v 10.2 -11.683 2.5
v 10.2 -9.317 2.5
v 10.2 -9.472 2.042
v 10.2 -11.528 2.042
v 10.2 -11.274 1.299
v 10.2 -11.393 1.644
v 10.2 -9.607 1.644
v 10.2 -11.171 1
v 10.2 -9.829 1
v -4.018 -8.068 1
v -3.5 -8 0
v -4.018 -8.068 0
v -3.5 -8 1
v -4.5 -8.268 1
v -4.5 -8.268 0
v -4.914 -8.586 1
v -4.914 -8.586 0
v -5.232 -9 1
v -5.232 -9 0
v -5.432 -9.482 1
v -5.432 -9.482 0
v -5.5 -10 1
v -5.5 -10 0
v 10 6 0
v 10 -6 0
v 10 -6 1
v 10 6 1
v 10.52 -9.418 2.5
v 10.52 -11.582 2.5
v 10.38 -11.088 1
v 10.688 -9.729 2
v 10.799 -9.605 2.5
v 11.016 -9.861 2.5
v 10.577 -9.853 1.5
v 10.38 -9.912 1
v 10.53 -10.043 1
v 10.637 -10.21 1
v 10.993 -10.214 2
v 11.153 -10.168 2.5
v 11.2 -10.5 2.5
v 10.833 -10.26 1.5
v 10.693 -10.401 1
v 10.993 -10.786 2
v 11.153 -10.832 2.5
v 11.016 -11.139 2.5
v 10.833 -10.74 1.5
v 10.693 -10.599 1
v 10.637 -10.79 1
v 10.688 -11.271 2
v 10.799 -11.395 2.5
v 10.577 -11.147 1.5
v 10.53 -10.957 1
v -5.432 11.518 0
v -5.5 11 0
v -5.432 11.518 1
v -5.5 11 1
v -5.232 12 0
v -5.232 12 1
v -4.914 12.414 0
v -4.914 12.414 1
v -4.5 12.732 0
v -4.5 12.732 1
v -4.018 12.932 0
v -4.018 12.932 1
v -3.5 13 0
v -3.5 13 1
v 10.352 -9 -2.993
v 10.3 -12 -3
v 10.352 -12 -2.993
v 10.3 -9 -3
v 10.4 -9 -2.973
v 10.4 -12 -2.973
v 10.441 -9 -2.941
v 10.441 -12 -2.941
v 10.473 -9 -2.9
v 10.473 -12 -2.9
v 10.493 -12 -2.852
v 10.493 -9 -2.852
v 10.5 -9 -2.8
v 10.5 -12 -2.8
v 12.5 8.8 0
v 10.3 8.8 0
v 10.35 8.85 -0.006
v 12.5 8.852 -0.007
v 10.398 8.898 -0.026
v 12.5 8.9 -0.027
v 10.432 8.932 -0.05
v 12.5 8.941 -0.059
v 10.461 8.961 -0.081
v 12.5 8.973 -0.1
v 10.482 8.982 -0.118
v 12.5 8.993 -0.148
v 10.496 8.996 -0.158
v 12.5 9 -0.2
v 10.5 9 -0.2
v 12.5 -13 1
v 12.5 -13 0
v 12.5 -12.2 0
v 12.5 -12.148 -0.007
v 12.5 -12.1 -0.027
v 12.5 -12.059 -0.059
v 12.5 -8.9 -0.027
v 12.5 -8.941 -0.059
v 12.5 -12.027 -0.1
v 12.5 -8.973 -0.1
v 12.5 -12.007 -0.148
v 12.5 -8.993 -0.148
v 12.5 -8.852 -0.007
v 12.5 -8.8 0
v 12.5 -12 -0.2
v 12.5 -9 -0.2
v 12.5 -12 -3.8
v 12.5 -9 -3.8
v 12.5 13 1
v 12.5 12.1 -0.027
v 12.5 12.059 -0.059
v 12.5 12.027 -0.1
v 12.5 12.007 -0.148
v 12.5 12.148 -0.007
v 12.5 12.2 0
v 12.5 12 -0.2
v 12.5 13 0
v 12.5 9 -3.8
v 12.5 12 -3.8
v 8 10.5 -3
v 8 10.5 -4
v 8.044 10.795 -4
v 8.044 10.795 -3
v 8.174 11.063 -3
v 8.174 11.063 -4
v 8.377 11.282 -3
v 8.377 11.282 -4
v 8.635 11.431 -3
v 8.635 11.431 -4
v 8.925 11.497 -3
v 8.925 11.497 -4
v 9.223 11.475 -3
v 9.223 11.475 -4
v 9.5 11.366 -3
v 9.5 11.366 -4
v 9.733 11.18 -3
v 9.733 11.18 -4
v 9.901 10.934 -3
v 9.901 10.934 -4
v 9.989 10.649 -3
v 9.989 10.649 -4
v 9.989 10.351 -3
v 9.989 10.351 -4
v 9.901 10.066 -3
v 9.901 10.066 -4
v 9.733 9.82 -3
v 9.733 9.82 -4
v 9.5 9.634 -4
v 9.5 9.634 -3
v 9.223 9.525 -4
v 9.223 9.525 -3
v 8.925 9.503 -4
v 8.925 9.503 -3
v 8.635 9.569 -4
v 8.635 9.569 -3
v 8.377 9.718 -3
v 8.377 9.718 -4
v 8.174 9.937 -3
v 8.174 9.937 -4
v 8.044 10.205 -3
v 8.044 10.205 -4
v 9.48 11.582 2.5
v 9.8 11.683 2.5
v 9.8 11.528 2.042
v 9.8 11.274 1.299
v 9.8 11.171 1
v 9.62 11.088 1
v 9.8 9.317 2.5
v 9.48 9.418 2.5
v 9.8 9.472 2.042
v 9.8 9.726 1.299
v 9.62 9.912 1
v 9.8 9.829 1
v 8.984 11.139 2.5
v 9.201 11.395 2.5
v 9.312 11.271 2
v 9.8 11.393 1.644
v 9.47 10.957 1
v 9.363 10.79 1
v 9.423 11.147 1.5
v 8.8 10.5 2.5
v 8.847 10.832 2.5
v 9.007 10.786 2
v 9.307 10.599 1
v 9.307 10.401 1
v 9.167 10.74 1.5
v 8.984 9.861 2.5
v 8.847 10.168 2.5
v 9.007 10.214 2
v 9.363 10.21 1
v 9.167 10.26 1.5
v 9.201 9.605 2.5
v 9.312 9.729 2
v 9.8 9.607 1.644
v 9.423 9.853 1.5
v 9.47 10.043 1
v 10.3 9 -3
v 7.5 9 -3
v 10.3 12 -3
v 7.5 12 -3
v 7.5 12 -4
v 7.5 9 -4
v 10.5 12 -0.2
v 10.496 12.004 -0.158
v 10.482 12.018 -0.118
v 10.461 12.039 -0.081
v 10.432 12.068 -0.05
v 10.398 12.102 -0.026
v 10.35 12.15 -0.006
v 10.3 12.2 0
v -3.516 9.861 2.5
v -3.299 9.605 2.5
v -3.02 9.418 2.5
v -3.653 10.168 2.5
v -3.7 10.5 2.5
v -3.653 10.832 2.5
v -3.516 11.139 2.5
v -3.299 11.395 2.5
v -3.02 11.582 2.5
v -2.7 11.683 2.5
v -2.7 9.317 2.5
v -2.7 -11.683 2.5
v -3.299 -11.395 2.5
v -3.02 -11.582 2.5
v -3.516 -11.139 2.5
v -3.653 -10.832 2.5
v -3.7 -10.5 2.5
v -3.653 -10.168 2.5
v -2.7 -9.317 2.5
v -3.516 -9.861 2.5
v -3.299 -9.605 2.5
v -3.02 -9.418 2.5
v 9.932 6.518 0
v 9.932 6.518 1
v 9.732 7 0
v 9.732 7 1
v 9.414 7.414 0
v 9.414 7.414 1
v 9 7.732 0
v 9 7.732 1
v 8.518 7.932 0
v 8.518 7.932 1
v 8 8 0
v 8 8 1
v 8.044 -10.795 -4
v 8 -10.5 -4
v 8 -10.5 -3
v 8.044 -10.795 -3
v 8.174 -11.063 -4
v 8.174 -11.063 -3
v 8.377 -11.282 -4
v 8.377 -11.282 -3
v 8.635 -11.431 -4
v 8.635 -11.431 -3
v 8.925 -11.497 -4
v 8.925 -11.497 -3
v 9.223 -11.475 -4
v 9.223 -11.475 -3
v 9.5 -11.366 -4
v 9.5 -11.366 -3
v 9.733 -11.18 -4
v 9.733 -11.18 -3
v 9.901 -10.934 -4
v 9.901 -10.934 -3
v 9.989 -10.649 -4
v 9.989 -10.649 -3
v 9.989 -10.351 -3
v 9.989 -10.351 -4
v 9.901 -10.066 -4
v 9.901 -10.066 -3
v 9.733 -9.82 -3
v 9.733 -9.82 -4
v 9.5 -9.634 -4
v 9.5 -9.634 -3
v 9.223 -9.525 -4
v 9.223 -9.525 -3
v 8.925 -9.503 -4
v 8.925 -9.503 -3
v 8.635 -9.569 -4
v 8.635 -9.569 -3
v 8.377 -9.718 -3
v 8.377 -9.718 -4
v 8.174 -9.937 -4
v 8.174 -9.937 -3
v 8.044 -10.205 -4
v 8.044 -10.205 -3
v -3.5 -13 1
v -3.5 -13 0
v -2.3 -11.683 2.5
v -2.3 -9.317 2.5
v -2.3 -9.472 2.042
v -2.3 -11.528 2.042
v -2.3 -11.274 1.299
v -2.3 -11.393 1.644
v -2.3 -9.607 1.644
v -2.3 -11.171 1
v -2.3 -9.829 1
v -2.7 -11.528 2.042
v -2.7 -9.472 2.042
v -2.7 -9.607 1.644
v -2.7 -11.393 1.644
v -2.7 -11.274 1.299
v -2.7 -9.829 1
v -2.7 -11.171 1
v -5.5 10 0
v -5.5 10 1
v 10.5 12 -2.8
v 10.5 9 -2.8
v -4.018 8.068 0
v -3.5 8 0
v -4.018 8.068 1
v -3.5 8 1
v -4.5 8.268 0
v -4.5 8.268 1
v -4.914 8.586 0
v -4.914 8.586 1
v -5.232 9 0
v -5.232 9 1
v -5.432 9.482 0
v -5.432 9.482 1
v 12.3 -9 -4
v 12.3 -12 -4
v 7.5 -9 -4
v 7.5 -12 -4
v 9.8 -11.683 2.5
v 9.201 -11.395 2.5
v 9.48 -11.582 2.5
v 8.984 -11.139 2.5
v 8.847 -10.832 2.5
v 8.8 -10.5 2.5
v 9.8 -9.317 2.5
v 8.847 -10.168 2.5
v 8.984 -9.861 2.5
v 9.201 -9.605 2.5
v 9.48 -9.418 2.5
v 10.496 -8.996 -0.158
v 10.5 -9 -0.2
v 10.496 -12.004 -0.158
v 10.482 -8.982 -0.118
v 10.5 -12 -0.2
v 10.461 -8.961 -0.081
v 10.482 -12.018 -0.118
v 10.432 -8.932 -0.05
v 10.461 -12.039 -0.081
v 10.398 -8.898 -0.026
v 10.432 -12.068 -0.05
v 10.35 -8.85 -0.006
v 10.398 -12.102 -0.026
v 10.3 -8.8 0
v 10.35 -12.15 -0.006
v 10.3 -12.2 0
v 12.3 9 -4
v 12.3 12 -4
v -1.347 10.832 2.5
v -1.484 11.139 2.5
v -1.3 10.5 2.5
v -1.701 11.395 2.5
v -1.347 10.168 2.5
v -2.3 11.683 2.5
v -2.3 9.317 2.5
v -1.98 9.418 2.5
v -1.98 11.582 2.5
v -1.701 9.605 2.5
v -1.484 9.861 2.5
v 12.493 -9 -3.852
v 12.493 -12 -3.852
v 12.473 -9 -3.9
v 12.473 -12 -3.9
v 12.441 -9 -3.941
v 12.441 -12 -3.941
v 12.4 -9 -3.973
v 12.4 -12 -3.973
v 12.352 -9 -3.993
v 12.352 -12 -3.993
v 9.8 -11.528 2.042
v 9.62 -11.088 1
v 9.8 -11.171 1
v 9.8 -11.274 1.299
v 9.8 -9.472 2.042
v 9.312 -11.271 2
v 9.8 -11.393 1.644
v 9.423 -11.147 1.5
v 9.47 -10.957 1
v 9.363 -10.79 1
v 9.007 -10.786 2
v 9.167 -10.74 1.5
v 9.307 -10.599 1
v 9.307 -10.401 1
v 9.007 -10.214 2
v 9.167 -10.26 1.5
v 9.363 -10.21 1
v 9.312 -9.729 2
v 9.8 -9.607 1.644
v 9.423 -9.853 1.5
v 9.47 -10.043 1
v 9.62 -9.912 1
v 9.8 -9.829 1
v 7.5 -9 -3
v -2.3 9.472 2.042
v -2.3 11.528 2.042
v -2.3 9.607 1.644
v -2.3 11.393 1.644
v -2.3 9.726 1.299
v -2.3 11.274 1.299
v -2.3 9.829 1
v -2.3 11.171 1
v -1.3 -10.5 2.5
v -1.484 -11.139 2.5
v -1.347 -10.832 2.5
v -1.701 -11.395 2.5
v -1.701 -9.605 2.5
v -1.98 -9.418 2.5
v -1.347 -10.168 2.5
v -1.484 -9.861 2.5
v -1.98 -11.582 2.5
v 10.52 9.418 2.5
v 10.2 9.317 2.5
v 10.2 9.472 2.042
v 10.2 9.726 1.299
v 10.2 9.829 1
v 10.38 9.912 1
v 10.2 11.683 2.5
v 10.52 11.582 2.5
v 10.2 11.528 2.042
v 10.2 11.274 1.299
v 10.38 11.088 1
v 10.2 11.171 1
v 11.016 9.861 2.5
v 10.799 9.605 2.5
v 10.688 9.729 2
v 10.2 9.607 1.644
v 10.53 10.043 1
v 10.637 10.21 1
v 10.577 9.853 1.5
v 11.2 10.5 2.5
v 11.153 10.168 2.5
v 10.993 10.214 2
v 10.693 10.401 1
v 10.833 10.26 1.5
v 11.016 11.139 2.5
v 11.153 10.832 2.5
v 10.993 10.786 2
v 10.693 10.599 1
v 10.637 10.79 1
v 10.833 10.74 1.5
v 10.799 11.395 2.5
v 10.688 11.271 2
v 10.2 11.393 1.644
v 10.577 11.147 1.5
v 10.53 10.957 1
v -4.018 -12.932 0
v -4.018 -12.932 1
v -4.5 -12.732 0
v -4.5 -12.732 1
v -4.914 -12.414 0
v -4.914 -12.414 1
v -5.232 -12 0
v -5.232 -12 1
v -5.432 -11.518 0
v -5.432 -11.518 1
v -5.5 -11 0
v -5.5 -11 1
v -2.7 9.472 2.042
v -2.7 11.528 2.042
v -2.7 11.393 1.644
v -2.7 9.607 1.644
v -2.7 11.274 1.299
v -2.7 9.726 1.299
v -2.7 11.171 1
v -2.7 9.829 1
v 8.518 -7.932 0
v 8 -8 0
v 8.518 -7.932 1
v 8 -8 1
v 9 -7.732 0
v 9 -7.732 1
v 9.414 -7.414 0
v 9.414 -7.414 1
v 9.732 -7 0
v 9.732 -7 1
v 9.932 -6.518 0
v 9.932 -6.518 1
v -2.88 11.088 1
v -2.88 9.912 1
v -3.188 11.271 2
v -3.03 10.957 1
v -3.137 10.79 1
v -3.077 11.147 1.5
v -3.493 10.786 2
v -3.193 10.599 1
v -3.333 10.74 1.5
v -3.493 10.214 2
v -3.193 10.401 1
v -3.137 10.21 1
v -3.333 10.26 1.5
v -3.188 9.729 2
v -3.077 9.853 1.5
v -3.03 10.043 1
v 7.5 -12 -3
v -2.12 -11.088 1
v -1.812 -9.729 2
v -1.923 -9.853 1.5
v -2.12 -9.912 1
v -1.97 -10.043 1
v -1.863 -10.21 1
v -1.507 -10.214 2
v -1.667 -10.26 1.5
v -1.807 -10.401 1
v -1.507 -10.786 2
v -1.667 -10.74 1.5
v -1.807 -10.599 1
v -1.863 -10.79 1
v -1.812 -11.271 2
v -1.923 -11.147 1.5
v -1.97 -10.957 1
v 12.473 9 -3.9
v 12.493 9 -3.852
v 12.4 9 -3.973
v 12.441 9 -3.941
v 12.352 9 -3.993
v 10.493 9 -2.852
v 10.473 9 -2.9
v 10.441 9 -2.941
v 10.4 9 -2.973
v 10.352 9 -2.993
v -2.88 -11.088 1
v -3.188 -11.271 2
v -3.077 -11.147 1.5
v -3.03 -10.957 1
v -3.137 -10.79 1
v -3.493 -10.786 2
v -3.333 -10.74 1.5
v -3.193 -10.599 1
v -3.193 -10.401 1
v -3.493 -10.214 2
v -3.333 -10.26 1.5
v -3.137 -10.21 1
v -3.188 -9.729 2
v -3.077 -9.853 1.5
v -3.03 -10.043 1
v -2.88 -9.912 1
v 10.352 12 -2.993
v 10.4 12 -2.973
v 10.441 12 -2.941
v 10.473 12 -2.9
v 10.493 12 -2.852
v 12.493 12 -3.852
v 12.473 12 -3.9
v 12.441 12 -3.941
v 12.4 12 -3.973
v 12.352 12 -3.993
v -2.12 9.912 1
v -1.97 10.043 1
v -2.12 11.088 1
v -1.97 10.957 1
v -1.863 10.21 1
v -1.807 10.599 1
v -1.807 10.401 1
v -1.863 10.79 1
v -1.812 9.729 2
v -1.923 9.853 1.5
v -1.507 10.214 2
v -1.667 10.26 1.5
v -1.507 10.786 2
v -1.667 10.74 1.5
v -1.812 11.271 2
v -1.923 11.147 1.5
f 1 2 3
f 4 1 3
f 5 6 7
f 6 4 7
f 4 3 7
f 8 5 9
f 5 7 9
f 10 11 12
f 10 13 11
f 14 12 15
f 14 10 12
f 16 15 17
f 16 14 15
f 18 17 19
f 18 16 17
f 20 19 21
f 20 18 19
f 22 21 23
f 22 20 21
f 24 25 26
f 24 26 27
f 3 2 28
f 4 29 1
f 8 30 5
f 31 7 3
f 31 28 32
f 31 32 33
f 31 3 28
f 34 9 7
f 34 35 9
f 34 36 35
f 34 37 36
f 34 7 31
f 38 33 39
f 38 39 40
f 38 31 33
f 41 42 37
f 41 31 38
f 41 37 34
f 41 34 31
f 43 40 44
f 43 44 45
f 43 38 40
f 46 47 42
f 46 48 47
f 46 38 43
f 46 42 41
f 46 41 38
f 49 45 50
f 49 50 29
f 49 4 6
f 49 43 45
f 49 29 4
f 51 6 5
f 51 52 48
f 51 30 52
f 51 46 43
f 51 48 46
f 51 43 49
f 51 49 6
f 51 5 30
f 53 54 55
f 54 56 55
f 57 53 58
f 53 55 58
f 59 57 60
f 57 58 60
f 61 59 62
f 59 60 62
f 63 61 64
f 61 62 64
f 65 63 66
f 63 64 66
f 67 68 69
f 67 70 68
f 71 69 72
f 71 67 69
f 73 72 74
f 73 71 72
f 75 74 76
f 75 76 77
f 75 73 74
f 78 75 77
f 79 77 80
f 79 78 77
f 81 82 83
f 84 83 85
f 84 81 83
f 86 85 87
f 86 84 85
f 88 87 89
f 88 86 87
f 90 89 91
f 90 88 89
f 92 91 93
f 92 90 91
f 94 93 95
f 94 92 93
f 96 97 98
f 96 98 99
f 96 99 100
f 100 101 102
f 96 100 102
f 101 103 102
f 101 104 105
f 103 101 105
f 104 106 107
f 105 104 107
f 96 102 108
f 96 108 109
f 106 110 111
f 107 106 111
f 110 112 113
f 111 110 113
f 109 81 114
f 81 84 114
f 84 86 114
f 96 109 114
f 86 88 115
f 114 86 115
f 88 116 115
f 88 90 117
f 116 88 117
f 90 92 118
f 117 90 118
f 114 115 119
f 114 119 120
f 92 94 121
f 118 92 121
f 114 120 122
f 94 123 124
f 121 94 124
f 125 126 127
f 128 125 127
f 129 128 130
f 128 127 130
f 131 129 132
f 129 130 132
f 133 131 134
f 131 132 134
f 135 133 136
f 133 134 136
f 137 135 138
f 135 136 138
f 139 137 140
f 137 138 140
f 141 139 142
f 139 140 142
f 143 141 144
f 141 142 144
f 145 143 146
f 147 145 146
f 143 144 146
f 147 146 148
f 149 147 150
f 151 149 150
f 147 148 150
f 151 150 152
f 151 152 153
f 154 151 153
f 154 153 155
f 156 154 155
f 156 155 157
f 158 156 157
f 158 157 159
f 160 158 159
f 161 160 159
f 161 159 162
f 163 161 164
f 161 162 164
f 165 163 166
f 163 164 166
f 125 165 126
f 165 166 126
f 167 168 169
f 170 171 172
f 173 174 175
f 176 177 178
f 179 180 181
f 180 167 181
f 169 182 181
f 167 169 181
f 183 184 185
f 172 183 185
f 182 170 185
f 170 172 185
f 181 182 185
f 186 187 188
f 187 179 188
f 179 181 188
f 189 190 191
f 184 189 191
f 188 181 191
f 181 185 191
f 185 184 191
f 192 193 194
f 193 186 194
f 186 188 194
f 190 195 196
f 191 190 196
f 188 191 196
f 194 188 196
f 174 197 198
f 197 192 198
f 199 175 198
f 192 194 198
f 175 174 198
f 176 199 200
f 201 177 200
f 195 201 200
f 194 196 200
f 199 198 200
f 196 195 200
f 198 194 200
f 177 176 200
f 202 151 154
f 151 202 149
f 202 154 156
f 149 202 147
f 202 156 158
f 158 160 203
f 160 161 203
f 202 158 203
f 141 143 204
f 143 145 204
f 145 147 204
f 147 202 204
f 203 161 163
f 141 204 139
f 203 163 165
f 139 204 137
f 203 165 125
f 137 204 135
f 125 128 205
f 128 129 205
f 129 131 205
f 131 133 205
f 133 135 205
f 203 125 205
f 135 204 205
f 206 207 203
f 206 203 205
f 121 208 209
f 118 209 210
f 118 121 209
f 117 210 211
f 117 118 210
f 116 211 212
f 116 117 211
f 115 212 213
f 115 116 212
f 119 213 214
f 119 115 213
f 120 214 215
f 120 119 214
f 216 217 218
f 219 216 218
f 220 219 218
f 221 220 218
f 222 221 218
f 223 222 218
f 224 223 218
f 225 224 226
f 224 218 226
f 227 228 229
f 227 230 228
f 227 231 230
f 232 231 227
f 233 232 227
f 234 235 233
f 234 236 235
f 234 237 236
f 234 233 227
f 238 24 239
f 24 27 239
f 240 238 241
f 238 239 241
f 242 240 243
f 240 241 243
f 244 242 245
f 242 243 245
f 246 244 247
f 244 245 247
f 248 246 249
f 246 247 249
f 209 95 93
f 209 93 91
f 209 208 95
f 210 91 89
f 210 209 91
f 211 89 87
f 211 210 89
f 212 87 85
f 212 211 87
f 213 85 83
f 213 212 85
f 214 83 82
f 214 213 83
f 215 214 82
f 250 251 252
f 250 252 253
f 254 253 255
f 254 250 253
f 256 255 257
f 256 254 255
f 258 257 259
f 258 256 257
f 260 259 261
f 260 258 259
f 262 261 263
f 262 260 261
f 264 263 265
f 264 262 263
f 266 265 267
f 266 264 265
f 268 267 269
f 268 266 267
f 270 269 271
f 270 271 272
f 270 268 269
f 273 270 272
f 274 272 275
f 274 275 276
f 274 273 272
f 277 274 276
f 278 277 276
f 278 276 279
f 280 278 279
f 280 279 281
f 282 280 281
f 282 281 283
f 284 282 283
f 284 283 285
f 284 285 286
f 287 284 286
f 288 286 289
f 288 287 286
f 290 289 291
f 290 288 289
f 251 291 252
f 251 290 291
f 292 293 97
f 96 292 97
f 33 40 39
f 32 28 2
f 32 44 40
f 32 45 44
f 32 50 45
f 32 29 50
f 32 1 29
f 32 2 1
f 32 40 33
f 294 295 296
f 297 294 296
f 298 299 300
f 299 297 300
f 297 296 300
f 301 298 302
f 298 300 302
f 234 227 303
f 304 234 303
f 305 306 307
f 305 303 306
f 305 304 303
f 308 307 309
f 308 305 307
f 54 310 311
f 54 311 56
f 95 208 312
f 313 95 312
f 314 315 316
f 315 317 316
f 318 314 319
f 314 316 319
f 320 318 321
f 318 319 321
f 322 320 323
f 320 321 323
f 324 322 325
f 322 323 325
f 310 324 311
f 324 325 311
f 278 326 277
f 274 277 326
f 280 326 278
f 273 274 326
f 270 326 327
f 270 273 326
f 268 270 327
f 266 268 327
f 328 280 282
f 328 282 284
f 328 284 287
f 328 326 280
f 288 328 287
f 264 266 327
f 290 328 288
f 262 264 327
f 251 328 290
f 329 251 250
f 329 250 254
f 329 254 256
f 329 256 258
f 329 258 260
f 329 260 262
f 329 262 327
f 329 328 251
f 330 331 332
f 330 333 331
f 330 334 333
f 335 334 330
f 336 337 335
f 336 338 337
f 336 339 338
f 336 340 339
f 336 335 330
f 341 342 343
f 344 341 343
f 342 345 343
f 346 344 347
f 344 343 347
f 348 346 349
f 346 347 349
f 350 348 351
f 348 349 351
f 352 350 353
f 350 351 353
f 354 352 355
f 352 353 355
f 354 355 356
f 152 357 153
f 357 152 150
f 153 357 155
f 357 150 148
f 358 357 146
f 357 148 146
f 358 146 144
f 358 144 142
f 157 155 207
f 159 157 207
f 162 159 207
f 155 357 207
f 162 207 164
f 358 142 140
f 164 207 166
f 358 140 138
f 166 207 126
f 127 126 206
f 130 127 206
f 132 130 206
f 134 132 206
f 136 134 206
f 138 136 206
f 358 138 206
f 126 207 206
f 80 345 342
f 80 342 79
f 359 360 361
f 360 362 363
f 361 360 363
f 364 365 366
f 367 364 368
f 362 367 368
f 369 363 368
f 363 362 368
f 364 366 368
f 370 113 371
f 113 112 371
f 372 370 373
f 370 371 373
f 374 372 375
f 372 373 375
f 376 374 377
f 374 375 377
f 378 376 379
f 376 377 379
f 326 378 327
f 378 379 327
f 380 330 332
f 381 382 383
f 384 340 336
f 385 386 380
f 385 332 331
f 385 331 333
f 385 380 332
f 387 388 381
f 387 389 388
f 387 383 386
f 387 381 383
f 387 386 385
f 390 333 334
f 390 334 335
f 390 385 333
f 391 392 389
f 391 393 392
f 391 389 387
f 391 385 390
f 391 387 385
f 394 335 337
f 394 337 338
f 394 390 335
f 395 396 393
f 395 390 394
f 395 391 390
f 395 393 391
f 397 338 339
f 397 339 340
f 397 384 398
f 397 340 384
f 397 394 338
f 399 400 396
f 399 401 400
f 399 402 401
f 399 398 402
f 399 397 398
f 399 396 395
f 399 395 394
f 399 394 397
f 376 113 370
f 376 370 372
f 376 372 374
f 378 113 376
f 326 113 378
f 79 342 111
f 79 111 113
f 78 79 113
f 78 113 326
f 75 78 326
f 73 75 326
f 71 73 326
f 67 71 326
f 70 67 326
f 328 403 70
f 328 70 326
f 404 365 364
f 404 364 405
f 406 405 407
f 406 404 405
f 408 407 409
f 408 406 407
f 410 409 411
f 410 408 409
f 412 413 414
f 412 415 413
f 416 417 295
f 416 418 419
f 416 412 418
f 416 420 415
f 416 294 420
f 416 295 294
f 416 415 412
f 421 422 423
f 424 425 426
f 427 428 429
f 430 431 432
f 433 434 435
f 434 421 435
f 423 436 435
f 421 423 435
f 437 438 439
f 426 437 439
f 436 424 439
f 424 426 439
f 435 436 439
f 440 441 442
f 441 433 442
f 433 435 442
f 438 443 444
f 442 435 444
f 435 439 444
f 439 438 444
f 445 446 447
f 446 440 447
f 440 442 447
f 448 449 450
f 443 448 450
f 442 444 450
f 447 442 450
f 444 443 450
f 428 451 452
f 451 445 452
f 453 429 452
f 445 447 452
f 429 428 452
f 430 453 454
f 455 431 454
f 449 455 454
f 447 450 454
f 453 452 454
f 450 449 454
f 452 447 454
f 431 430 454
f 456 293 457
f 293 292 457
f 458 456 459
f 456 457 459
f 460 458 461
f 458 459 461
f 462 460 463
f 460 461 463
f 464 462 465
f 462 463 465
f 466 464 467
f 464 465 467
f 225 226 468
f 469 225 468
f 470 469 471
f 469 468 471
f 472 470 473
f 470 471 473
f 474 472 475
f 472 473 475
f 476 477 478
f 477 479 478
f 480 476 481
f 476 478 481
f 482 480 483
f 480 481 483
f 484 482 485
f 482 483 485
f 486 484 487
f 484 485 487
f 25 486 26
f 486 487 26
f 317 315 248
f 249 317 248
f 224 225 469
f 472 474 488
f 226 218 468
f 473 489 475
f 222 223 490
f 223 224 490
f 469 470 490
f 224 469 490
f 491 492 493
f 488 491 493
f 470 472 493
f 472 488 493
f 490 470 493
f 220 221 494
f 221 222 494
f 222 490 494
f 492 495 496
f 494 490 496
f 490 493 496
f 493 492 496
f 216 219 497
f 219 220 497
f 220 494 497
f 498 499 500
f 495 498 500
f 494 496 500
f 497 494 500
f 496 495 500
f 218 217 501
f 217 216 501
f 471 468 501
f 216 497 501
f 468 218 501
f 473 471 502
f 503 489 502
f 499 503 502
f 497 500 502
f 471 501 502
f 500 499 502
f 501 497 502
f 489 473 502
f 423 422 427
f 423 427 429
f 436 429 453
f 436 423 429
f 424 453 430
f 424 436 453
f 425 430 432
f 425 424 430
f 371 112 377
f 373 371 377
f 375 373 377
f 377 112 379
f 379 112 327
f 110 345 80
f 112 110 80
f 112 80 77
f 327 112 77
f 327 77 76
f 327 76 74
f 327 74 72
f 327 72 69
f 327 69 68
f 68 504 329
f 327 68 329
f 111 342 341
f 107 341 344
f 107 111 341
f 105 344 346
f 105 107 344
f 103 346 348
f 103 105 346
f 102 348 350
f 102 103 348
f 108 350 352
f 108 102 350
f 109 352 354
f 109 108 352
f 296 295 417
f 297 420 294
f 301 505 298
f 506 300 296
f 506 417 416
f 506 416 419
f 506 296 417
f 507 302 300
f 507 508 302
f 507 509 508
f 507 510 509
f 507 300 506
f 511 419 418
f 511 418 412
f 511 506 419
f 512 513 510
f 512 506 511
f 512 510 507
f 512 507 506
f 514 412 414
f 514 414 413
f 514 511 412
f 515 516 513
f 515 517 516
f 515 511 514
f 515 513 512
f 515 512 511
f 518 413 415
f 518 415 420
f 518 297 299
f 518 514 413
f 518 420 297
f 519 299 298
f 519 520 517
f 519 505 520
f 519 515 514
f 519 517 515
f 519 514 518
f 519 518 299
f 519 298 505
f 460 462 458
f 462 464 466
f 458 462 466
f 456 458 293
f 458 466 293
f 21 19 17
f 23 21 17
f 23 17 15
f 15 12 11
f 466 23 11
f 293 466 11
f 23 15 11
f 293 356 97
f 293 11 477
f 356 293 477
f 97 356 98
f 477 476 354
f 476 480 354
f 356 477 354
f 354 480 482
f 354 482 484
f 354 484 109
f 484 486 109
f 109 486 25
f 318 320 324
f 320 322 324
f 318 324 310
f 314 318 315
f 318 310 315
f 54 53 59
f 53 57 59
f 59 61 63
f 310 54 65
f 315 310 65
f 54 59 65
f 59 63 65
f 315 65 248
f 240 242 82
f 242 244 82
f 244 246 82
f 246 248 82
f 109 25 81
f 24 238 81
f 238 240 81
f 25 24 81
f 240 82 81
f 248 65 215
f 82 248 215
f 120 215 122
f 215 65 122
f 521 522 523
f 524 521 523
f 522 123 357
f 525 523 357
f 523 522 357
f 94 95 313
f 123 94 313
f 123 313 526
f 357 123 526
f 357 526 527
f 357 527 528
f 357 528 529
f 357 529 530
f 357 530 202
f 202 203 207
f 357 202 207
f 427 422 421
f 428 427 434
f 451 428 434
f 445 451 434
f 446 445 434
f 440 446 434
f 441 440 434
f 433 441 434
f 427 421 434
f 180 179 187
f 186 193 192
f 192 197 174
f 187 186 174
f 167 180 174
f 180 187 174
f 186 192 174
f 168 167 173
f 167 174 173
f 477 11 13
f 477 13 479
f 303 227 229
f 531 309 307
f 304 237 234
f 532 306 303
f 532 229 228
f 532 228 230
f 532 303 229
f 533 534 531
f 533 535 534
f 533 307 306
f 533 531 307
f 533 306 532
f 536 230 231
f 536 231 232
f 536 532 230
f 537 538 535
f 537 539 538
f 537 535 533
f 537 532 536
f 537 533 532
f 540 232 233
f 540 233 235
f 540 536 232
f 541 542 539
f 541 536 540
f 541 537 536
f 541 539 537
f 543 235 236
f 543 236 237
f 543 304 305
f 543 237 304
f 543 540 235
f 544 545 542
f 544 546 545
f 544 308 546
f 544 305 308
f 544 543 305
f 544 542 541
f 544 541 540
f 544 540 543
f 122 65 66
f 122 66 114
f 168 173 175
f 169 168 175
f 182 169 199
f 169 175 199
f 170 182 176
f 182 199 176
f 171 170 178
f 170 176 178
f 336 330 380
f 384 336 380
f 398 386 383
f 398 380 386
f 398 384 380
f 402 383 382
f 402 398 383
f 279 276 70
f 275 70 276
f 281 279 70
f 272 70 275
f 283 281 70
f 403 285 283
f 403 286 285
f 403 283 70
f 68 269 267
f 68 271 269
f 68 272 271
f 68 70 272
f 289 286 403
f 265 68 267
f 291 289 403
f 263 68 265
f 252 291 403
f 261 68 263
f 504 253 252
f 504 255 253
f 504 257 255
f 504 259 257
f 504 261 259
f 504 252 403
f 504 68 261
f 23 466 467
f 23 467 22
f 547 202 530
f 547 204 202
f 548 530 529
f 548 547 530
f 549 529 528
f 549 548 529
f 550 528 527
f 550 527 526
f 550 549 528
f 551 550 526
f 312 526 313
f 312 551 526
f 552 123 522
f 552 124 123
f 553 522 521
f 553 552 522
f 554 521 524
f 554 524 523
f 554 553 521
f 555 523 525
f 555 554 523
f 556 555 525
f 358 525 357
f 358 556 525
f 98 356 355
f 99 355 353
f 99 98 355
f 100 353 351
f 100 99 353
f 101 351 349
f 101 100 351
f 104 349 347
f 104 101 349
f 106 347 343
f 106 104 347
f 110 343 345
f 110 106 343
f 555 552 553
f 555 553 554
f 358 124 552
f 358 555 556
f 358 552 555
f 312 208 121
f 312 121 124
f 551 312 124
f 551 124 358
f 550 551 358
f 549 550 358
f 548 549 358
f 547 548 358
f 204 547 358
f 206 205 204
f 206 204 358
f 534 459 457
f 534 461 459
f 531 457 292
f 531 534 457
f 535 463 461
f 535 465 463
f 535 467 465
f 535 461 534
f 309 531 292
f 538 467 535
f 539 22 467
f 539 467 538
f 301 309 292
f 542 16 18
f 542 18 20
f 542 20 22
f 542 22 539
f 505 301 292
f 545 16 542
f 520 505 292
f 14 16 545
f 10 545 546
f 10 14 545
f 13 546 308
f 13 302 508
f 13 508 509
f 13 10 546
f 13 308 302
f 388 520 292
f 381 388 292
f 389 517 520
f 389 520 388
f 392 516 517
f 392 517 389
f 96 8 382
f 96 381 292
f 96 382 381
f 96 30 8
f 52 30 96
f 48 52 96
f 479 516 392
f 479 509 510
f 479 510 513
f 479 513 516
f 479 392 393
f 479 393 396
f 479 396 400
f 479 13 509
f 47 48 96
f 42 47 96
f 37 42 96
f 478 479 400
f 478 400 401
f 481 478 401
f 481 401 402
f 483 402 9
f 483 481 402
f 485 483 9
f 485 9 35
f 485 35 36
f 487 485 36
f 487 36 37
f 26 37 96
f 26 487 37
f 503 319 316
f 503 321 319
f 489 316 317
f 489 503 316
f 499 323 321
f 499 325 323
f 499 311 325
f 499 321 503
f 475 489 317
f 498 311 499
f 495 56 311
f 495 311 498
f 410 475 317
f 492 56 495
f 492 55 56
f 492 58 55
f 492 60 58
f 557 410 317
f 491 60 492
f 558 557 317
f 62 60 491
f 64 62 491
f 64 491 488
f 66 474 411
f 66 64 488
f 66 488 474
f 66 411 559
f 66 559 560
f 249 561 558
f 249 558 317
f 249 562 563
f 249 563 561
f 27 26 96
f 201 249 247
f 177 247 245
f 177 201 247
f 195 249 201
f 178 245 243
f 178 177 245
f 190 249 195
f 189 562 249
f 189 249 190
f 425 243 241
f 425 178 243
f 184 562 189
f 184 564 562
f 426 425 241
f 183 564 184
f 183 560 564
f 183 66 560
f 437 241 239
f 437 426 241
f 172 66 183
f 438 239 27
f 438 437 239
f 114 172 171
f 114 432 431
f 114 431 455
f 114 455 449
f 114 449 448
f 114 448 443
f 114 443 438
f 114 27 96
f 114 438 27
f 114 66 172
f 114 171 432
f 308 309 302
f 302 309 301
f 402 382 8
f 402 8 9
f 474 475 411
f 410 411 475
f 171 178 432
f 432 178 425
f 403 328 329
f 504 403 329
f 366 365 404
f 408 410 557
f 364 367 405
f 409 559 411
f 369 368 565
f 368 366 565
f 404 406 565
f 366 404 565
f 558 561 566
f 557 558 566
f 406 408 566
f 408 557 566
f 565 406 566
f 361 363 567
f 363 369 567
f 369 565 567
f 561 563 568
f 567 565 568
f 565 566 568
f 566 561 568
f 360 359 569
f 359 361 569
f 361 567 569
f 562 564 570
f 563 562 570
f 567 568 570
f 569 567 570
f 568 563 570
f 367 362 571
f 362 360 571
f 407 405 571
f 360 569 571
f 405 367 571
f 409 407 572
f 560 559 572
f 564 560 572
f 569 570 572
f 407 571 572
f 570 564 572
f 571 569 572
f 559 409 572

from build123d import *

# Parameters (mm, degrees)
IZIM1_W                     = 25
IZIM1_H                     = 26
Y_KSEKLIK_EKSTR_ZYON1_DEPTH = 1
IZIM12_W                    = 0.4
IZIM12_H                    = 1.5
KES_EKSTR_ZYON2_DEPTH       = 12
KES_EKSTR_ZYON2_DEPTH_BACK  = 25.3
IZIM13_W                    = 20
IZIM13_H                    = 16
KES_EKSTR_ZYON4_DEPTH       = 5
KES_EKSTR_ZYON4_DEPTH_BACK  = 4
RADYUS1_R                   = 2
IZIM14_W                    = 7
IZIM14_H                    = 26
KES_EKSTR_ZYON5_DEPTH       = 3
KES_EKSTR_ZYON5_DEPTH_BACK  = 3
RADYUS2_R                   = 2
IZIM17_W                    = 4
IZIM17_H                    = 3
Y_KSEKLIK_EKSTR_ZYON2_DEPTH = 2
IZIM18_W                    = 4
IZIM18_H                    = 3
Y_KSEKLIK_EKSTR_ZYON3_DEPTH = 1
IZIM19_R                    = 1
KES_EKSTR_ZYON6_DEPTH       = 1
RADYUS3_R                   = 0.2
RADYUS3_OF_AYNALAMA2_R      = 0.2


with BuildPart() as part:
    # Çizim1 → Yükseklik-Ekstrüzyon1 (new body)
    with BuildSketch(Plane.XY):
        Rectangle(IZIM1_W, IZIM1_H)
    extrude(amount=Y_KSEKLIK_EKSTR_ZYON1_DEPTH)

    # Çizim9 → Döndür1 (revolve)
    with BuildSketch(Plane(origin=(0, 10.5, 0), x_dir=(1, 0, 0), z_dir=(0, 1, 0))):
        Polygon((-2.5, -1), (-2.5, -2.5), (-3.7, -2.5), (-3.2, -1), align=None)
    d_nd_r1 = revolve(axis=Axis((-2.5, 10.5, 1), (0, 0, 1)))

    # Çizim11 → Döndür2 (revolve)
    with BuildSketch(Plane(origin=(0, 10.5, 0), x_dir=(1, 0, 0), z_dir=(0, 1, 0))):
        Polygon((10, -1), (10, -2.5), (8.8, -2.5), (9.3, -1), align=None)
    d_nd_r2 = revolve(axis=Axis((10, 10.5, 1), (0, 0, 1)))

    # Aynalama1: Döndür1, Döndür2 across plane
    add(d_nd_r1.mirror(Plane.ZX))
    add(d_nd_r2.mirror(Plane.ZX))

    # Çizim12 → Kes-Ekstrüzyon2 (cut, two sides)
    with BuildSketch(Plane(origin=(0, 10.5, 0), x_dir=(1, 0, 0), z_dir=(0, 1, 0))) as kes_ekstr_zyon2_sk:
        with Locations((-2.5, -1.75)):
            Rectangle(IZIM12_W, IZIM12_H)
        with Locations((10, -1.75)):
            Rectangle(IZIM12_W, IZIM12_H)
    extrude(amount=KES_EKSTR_ZYON2_DEPTH, mode=Mode.SUBTRACT)
    extrude(kes_ekstr_zyon2_sk.sketch, amount=-KES_EKSTR_ZYON2_DEPTH_BACK, mode=Mode.SUBTRACT)

    # Çizim13 → Kes-Ekstrüzyon4 (cut, two sides)
    with BuildSketch(Plane.XY) as kes_ekstr_zyon4_sk:
        Rectangle(IZIM13_W, IZIM13_H)
    extrude(amount=KES_EKSTR_ZYON4_DEPTH, mode=Mode.SUBTRACT)
    extrude(kes_ekstr_zyon4_sk.sketch, amount=-KES_EKSTR_ZYON4_DEPTH_BACK, mode=Mode.SUBTRACT)

    # Radyus1
    radyus1_edges = [part.edges().sort_by_distance(p)[0] for p in [
        (10, 8, 0.5),
        (-10, 8, 0.5),
        (-10, -8, 0.5),
        (10, -8, 0.5),
    ]]
    fillet(radyus1_edges, radius=RADYUS1_R)

    # Çizim14 → Kes-Ekstrüzyon5 (cut, two sides)
    with BuildSketch(Plane.XY) as kes_ekstr_zyon5_sk:
        with Locations((-9, 0)):
            Rectangle(IZIM14_W, IZIM14_H)
    extrude(amount=KES_EKSTR_ZYON5_DEPTH, mode=Mode.SUBTRACT)
    extrude(kes_ekstr_zyon5_sk.sketch, amount=-KES_EKSTR_ZYON5_DEPTH_BACK, mode=Mode.SUBTRACT)

    # Radyus2
    radyus2_edges = [part.edges().sort_by_distance(p)[0] for p in [
        (-5.5, -8, 0.5),
        (-5.5, 13, 0.5),
        (-5.5, -13, 0.5),
        (-5.5, 8, 0.5),
    ]]
    fillet(radyus2_edges, radius=RADYUS2_R)

    # Çizim17 → Yükseklik-Ekstrüzyon2 (add)
    with BuildSketch(Plane(origin=(10.5, 0, 0), x_dir=(0, 0, -1), z_dir=(1, 0, 0))):
        with Locations((2, 10.5)):
            Rectangle(IZIM17_W, IZIM17_H)
    y_kseklik_ekstr_zyon2 = extrude(amount=Y_KSEKLIK_EKSTR_ZYON2_DEPTH)

    # Çizim18 → Yükseklik-Ekstrüzyon3 (add)
    with BuildSketch(Plane(origin=(0, 0, -4), x_dir=(-1, 0, 0), z_dir=(0, 0, -1))):
        with Locations((-9.5, 10.5)):
            Rectangle(IZIM18_W, IZIM18_H)
    y_kseklik_ekstr_zyon3 = extrude(amount=-Y_KSEKLIK_EKSTR_ZYON3_DEPTH)

    # Çizim19 → Kes-Ekstrüzyon6 (cut)
    with BuildSketch(Plane(origin=(0, 0, -4), x_dir=(-1, 0, 0), z_dir=(0, 0, -1))):
        with Locations((-9, 10.5)):
            Circle(IZIM19_R)
    kes_ekstr_zyon6 = extrude(amount=-KES_EKSTR_ZYON6_DEPTH, mode=Mode.SUBTRACT)

    # Radyus3
    radyus3_edges = [part.edges().sort_by_distance(p)[0] for p in [
        (10.5, 10.5, 0),
        (11.5, 12, 0),
        (11.5, 9, 0),
        (12.5, 10.5, -4),
        (10.5, 10.5, -3),
    ]]
    fillet(radyus3_edges, radius=RADYUS3_R)

    # Aynalama2: Yükseklik-Ekstrüzyon2, Yükseklik-Ekstrüzyon3, Kes-Ekstrüzyon6 across plane
    add(y_kseklik_ekstr_zyon2.mirror(Plane.ZX))
    add(y_kseklik_ekstr_zyon3.mirror(Plane.ZX))
    add(kes_ekstr_zyon6.mirror(Plane.ZX), mode=Mode.SUBTRACT)

    # Radyus3 of Aynalama2
    radyus3_of_aynalama2_edges = [part.edges().sort_by_distance(p)[0] for p in [
        (10.5, -10.5, 0),
        (11.5, -12, 0),
        (11.5, -9, 0),
        (12.5, -10.5, -4),
        (10.5, -10.5, -3),
    ]]
    fillet(radyus3_of_aynalama2_edges, radius=RADYUS3_OF_AYNALAMA2_R)


solid = part.part
